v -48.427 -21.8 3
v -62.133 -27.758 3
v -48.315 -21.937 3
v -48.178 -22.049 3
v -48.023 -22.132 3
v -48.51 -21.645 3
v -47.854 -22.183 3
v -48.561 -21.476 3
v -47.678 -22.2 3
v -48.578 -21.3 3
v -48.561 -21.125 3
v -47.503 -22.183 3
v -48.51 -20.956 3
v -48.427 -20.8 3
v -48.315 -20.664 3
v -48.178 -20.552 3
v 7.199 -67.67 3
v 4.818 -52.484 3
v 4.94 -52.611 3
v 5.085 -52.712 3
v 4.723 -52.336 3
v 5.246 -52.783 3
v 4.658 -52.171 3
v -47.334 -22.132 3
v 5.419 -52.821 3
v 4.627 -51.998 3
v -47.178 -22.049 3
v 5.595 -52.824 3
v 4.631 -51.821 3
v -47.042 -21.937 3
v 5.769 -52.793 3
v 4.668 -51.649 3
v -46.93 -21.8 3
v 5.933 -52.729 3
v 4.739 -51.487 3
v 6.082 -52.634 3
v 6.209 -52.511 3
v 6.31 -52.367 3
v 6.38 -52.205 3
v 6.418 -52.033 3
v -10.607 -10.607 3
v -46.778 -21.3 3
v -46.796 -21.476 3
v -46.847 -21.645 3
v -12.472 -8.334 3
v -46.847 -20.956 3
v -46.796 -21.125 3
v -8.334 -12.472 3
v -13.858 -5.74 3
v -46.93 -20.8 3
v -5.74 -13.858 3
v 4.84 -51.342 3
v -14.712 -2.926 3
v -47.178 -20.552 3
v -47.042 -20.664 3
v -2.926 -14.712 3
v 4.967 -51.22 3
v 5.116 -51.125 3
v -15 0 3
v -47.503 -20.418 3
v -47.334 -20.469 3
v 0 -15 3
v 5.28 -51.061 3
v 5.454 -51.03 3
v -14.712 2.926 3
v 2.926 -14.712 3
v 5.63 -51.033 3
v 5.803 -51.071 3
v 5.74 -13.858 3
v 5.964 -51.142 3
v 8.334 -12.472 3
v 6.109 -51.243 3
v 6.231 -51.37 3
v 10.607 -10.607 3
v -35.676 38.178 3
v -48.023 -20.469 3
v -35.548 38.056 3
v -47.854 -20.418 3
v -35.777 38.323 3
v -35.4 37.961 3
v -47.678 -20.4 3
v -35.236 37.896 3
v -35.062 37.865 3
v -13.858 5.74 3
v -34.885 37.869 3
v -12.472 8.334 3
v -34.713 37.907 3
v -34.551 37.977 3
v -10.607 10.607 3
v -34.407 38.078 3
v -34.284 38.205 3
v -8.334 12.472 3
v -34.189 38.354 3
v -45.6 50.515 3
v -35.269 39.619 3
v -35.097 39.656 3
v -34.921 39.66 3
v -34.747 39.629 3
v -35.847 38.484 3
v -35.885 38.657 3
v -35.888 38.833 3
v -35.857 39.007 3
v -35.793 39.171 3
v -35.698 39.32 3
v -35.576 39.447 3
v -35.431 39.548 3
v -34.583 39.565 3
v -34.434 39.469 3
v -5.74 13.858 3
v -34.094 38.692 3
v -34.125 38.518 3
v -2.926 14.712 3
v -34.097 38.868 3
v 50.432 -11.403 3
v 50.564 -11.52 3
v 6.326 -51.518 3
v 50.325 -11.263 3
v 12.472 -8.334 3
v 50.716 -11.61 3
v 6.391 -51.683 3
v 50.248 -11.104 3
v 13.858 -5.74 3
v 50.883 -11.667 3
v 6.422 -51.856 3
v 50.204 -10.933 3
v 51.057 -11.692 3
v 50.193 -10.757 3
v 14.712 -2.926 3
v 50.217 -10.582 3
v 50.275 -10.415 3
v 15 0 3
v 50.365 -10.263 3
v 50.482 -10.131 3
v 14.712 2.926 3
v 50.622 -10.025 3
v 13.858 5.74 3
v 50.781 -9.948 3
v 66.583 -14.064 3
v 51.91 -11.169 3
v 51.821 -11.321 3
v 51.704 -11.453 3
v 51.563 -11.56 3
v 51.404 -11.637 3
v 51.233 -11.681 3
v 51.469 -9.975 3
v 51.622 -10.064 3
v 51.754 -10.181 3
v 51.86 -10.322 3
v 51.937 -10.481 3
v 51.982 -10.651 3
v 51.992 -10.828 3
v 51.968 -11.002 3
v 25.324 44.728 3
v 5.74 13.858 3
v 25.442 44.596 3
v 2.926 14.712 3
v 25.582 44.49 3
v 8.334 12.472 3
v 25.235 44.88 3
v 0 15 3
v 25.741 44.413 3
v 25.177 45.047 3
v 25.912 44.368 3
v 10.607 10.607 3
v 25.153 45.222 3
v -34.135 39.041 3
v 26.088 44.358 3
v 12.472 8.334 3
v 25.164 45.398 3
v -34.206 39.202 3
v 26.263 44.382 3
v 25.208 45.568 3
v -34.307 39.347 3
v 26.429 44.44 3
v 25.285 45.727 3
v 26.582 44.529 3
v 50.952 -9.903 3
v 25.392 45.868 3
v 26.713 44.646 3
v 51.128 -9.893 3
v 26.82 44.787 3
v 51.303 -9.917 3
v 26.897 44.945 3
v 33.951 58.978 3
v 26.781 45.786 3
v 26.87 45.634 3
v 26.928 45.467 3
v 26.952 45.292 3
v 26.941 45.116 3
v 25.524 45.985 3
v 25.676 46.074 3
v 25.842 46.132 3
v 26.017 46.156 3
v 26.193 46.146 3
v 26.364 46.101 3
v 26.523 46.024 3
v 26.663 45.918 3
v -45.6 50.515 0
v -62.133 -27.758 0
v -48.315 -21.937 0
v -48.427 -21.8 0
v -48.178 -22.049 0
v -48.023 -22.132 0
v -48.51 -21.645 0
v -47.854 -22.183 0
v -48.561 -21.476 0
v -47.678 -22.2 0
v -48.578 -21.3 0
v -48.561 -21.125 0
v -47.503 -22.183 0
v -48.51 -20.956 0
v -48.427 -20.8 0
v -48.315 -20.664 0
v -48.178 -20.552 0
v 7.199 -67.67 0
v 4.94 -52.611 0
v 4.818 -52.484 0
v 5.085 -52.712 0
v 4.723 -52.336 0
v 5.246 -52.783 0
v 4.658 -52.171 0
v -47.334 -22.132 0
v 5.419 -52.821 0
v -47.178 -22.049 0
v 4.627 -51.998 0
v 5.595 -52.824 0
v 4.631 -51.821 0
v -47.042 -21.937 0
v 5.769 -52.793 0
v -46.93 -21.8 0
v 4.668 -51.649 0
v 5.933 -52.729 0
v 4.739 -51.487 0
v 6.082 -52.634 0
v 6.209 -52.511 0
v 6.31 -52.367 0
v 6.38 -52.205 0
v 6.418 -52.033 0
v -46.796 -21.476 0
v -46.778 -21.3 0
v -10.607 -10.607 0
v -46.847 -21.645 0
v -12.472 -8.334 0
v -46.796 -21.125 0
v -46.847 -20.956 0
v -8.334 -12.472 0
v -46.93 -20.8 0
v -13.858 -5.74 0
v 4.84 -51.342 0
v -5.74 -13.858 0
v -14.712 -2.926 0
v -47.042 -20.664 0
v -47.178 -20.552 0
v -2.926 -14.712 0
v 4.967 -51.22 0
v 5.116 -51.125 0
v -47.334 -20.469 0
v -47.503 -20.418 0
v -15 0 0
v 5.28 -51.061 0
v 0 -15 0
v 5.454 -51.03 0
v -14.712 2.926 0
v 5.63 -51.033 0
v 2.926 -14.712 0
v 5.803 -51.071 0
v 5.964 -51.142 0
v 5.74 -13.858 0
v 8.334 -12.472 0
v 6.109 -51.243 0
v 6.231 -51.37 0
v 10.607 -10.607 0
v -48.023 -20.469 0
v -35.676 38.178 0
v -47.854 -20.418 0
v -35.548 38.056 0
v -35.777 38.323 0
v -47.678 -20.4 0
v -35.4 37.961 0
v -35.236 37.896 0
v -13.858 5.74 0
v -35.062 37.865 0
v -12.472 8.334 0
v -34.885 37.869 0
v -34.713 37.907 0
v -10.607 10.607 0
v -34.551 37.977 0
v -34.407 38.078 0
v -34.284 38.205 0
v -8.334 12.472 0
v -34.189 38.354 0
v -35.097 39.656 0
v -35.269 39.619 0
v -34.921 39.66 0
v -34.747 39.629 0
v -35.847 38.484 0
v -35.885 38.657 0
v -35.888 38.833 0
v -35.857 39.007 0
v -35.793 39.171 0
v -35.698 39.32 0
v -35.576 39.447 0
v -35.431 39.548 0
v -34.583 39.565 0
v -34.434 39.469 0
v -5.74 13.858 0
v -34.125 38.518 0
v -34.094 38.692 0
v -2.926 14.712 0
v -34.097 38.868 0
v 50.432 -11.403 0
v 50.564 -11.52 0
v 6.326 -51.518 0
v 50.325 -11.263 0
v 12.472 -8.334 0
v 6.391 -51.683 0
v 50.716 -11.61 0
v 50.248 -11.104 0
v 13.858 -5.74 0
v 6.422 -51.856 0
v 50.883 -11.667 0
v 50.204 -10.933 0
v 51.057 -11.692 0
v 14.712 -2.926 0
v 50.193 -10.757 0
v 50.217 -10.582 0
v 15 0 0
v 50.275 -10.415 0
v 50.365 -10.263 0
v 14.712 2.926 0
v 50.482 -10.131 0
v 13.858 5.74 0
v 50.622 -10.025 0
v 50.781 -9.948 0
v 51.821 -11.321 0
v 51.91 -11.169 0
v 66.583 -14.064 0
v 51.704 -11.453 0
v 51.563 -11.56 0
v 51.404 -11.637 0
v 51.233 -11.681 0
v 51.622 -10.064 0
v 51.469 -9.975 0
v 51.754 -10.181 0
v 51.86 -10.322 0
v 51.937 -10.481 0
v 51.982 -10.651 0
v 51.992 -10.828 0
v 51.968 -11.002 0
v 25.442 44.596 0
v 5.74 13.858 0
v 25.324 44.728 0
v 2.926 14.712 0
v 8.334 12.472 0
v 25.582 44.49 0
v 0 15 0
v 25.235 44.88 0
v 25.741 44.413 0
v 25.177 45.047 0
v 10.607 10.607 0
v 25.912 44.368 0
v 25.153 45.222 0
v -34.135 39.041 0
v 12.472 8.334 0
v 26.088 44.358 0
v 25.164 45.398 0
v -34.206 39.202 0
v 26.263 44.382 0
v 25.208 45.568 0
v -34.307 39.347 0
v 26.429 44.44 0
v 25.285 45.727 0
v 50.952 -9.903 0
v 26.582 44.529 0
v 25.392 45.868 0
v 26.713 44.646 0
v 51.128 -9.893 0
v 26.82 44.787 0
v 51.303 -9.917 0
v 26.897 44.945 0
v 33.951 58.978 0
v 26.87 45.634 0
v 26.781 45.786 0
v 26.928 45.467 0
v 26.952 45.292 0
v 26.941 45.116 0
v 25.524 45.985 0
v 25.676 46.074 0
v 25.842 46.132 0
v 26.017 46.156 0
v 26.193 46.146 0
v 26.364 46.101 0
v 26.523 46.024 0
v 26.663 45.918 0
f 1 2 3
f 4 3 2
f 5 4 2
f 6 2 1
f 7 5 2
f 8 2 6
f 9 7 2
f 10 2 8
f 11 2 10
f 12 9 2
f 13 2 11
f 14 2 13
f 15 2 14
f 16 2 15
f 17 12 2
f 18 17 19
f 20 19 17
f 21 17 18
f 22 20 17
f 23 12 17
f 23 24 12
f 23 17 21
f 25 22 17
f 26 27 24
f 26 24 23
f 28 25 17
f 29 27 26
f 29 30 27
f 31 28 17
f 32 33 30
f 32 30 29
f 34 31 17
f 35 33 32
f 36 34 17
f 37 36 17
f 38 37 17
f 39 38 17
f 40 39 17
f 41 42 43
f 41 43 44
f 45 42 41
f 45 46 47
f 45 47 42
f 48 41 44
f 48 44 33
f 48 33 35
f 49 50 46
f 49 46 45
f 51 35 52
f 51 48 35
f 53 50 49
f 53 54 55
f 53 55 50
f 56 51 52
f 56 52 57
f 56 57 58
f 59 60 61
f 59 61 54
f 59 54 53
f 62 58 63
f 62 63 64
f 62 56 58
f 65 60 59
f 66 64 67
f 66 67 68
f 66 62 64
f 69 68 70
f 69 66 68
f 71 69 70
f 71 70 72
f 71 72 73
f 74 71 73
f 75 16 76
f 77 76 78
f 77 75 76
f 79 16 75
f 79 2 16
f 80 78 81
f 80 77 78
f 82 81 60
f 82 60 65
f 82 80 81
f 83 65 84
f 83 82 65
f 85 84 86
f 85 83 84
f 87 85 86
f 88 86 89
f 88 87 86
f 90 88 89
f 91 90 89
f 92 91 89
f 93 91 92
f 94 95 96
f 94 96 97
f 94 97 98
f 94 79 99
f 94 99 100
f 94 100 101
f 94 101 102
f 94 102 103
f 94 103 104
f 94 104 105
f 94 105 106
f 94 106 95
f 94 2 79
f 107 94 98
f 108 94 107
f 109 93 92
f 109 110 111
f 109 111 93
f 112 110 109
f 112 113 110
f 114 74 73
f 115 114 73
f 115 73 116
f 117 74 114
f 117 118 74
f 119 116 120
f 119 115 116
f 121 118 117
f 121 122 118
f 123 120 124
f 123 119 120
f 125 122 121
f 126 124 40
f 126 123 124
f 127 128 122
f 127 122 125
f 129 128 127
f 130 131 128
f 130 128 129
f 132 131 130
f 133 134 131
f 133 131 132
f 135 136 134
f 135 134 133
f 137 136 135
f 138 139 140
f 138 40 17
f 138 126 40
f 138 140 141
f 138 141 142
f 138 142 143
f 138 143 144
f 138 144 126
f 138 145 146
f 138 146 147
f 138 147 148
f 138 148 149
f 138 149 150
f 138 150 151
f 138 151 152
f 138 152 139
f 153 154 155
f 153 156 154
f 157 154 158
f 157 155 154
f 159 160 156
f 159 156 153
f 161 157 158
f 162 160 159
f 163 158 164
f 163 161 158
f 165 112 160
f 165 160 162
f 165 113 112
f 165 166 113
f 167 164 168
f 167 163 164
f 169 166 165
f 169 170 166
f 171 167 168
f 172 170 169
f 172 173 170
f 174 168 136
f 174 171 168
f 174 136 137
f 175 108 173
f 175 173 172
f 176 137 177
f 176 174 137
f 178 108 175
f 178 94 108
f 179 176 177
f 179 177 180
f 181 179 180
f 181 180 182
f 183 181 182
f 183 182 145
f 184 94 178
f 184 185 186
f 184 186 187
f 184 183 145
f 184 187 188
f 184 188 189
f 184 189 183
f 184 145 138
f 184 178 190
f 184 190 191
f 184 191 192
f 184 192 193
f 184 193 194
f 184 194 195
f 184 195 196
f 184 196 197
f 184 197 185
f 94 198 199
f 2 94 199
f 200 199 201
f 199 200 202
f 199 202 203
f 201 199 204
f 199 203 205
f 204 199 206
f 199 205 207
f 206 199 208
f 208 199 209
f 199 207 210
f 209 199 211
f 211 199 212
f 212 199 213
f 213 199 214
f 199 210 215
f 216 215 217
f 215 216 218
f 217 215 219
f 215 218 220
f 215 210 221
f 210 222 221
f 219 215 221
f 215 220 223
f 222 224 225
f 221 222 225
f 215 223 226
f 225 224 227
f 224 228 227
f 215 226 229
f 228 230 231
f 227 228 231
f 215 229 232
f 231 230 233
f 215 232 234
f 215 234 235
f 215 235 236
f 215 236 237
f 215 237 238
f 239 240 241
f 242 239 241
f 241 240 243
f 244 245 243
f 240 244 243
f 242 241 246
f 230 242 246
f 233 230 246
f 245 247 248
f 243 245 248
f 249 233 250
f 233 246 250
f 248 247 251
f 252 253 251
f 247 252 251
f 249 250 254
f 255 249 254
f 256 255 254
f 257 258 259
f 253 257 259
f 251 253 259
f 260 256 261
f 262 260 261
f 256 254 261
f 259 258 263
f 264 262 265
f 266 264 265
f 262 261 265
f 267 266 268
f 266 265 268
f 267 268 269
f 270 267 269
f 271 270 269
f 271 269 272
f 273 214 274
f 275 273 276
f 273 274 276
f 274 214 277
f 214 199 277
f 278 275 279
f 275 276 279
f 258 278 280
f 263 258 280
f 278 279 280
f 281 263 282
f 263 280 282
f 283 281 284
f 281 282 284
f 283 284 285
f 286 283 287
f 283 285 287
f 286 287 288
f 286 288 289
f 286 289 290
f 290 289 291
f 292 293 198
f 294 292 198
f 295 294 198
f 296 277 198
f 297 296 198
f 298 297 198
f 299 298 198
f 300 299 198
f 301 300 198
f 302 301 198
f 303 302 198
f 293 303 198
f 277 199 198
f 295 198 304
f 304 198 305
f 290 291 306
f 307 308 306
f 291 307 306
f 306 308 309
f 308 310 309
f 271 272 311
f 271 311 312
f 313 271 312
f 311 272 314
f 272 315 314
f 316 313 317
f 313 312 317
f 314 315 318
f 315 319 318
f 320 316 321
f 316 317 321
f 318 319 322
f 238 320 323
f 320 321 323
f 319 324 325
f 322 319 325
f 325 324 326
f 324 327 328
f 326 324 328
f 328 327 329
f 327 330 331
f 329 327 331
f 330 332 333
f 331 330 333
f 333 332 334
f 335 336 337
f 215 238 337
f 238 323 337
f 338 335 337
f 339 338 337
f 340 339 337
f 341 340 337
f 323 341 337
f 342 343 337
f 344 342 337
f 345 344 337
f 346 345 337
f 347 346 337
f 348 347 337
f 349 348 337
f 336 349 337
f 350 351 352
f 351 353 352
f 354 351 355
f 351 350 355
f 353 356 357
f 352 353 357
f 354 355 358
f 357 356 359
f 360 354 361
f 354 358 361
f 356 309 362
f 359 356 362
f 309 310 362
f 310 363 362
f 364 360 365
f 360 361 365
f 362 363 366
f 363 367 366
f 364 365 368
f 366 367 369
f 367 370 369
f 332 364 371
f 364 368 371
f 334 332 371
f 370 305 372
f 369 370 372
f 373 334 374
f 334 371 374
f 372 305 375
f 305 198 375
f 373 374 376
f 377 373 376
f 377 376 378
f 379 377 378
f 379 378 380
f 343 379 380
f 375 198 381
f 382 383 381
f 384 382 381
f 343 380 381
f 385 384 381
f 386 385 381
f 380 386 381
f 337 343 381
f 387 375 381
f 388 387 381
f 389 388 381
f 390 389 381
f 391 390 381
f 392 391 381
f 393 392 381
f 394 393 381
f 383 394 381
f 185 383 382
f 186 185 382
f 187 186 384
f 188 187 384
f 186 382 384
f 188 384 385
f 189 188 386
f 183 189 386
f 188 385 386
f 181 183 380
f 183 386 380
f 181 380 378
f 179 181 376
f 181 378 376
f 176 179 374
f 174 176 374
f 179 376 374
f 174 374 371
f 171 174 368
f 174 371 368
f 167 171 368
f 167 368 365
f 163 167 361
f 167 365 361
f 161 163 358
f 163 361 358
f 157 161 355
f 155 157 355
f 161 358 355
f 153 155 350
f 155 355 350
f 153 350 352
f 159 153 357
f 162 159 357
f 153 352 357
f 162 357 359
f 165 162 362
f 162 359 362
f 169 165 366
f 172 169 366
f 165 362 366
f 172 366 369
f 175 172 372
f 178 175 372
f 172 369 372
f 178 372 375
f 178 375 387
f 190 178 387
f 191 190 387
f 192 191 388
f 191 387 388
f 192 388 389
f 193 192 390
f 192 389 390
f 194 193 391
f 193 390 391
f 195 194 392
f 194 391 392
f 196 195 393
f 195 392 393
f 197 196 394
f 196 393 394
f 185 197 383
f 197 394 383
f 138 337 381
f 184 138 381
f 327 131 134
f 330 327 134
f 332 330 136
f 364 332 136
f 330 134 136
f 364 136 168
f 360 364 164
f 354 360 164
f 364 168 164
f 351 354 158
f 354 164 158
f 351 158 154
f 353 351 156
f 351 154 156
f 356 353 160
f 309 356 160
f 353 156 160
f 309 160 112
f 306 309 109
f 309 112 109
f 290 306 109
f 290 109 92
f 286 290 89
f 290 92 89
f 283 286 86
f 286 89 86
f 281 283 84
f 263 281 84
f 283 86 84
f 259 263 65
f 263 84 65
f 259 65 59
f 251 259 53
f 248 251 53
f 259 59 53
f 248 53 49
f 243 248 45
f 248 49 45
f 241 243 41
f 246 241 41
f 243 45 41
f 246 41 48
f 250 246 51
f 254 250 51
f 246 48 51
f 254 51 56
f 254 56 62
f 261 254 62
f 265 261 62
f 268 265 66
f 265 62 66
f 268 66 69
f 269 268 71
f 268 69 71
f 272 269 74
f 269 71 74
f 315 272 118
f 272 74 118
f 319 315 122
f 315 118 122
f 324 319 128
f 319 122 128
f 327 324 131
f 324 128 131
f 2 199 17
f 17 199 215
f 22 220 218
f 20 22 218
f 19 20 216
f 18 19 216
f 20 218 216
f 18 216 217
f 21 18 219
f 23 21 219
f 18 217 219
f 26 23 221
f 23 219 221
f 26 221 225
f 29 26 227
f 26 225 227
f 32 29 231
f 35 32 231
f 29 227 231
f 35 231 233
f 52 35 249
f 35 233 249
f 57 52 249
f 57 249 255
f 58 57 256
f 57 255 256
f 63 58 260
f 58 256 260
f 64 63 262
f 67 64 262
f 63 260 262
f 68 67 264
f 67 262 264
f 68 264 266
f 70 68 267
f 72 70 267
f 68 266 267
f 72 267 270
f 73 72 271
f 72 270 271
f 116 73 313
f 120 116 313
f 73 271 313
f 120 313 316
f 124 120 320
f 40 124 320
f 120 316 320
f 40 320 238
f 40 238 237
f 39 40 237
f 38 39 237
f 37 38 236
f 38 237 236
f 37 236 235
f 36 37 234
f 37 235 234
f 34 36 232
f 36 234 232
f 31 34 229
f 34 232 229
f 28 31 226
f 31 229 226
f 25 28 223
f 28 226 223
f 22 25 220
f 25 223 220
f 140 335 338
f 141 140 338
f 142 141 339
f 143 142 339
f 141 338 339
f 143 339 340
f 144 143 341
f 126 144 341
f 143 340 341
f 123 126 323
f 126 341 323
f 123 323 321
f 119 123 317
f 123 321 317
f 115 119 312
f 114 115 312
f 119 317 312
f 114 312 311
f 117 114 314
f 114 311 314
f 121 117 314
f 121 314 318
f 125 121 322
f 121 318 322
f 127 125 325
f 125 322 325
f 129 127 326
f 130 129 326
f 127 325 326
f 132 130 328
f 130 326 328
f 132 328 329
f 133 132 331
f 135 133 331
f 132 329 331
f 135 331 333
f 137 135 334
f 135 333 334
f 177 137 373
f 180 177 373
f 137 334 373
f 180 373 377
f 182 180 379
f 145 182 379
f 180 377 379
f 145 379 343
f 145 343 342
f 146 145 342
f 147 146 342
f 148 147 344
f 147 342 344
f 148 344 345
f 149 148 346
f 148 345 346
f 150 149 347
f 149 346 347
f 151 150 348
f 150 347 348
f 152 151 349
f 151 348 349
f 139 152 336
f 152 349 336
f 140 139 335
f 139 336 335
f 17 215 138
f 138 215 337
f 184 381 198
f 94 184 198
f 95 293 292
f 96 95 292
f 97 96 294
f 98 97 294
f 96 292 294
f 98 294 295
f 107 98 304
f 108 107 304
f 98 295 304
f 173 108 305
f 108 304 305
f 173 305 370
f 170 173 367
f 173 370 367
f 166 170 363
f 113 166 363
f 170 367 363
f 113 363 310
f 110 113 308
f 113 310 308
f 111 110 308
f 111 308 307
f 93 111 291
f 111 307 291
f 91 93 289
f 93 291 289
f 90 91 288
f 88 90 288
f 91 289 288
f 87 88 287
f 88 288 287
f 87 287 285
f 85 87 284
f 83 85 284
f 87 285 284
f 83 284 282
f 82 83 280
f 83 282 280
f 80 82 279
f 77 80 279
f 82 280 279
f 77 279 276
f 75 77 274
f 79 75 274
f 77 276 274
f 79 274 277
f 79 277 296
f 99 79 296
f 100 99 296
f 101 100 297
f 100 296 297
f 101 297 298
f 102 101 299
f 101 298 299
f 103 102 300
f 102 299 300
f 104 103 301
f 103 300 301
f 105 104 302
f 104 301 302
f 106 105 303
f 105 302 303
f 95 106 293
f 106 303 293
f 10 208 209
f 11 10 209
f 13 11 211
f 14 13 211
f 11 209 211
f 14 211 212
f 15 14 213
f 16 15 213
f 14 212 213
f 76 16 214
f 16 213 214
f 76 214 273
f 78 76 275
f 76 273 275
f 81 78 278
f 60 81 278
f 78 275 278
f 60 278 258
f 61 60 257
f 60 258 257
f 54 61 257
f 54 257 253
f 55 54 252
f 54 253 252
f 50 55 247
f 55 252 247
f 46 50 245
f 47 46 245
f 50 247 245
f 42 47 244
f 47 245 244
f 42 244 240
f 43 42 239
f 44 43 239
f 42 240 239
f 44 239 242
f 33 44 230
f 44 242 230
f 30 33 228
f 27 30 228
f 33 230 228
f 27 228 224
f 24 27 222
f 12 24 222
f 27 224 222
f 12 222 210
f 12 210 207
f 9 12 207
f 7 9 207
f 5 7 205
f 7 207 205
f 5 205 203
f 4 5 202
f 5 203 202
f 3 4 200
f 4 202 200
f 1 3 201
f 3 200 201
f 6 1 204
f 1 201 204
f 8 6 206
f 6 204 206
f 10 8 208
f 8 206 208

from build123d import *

# Parameters (mm, degrees)
BOSS_EXTRUDE1_DEPTH = 3
SKETCH3_R           = 15
CUT_EXTRUDE1_DEPTH  = 3
SKETCH4_R           = 0.9
CUT_EXTRUDE2_DEPTH  = 3
CIRPATTERN1_COUNT   = 5


with BuildPart() as part:
    # Sketch1 → Boss-Extrude1 (new body)
    with BuildSketch(Plane.XY):
        Polygon((-62.133450379, -27.758203286), (7.199328029, -67.670179411), (66.582879797, -14.064267615), (33.951154754, 58.977983998), (-45.599912202, 50.514666314), align=None)
    extrude(amount=BOSS_EXTRUDE1_DEPTH)

    # Sketch3 → Cut-Extrude1 (cut)
    with BuildSketch(Plane.XY.offset(3)):
        Circle(SKETCH3_R)
    extrude(amount=-CUT_EXTRUDE1_DEPTH, mode=Mode.SUBTRACT)

    # Sketch4 → Cut-Extrude2 (cut)
    with BuildSketch(Plane(origin=(0, 0, 0), x_dir=(-1, 0, 0), z_dir=(0, 0, -1))):
        with Locations((47.678329741, -21.300358522)):
            Circle(SKETCH4_R)
    cut_extrude2 = extrude(amount=-CUT_EXTRUDE2_DEPTH, mode=Mode.SUBTRACT)

    # CirPattern1: Cut-Extrude2 ×5 about axis
    cirpattern1_axis = Axis((0, 0, 0), (0, 0, 1))
    for i in range(1, CIRPATTERN1_COUNT):
        add(cut_extrude2.rotate(cirpattern1_axis, i * 360 / CIRPATTERN1_COUNT), mode=Mode.SUBTRACT)


solid = part.part
